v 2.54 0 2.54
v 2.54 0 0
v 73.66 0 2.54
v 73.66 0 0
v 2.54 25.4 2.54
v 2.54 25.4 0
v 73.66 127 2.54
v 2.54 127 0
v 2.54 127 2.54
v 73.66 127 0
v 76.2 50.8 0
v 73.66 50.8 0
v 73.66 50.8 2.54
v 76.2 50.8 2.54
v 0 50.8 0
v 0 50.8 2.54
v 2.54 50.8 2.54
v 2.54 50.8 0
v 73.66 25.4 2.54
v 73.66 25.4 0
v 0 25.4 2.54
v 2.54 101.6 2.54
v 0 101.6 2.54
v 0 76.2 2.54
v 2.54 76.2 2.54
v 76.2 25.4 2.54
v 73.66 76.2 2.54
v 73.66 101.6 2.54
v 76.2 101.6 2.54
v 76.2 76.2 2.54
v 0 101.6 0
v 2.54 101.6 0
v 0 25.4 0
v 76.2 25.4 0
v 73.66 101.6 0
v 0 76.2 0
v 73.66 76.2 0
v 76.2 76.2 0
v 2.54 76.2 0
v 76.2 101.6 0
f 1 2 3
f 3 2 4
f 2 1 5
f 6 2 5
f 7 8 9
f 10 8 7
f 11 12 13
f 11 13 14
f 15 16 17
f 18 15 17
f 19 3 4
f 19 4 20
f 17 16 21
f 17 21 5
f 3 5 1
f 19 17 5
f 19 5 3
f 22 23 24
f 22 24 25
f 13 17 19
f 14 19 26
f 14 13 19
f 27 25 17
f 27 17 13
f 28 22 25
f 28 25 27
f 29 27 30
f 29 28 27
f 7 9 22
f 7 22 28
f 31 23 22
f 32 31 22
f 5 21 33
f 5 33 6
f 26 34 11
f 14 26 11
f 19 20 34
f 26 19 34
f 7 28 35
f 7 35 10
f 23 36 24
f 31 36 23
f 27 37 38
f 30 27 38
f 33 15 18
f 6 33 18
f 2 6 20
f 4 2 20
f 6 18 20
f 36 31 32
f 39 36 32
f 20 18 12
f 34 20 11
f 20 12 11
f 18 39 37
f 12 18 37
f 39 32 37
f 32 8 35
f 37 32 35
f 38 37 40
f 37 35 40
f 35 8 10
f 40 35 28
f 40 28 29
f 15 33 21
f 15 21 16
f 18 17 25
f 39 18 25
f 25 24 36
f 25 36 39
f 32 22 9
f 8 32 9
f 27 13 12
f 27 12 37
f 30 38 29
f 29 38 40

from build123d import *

# Parameters (mm, degrees)
SKETCH1_W           = 76.2
SKETCH1_H           = 127
BOSS_EXTRUDE1_DEPTH = 2.54
SKETCH2_W           = 2.54
SKETCH2_H           = 25.4
CUT_EXTRUDE1_DEPTH  = 3.54
SKETCH4_W           = 2.54
SKETCH4_H           = 25.4
CUT_EXTRUDE3_DEPTH  = 3.54
SKETCH3_W           = 2.54
SKETCH3_H           = 25.4
CUT_EXTRUDE4_DEPTH  = 3.54


with BuildPart() as part:
    # Sketch1 → Boss-Extrude1 (new body)
    with BuildSketch(Plane.XY):
        with Locations((38.1, 63.5)):
            Rectangle(SKETCH1_W, SKETCH1_H)
    extrude(amount=BOSS_EXTRUDE1_DEPTH)

    # Sketch2 → Cut-Extrude1 (cut, through all)
    with BuildSketch(Plane.XY.offset(2.54)):
        with Locations((1.27, 114.3)):
            Rectangle(SKETCH2_W, SKETCH2_H)
    extrude(amount=-CUT_EXTRUDE1_DEPTH, mode=Mode.SUBTRACT)

    # Sketch4 → Cut-Extrude3 (cut, through all)
    with BuildSketch(Plane.XY.offset(2.54)):
        with Locations((1.27, 12.7)):
            Rectangle(SKETCH4_W, SKETCH4_H)
        with Locations((74.93, 12.7)):
            Rectangle(SKETCH4_W, SKETCH4_H)
        with Locations((1.27, 63.5)):
            Rectangle(SKETCH4_W, SKETCH4_H)
        with Locations((74.93, 63.5)):
            Rectangle(SKETCH4_W, SKETCH4_H)
    extrude(amount=-CUT_EXTRUDE3_DEPTH, mode=Mode.SUBTRACT)

    # Sketch3 → Cut-Extrude4 (cut, through all)
    with BuildSketch(Plane.XY.offset(2.54)):
        with Locations((74.93, 114.3)):
            Rectangle(SKETCH3_W, SKETCH3_H)
    extrude(amount=-CUT_EXTRUDE4_DEPTH, mode=Mode.SUBTRACT)


solid = part.part
